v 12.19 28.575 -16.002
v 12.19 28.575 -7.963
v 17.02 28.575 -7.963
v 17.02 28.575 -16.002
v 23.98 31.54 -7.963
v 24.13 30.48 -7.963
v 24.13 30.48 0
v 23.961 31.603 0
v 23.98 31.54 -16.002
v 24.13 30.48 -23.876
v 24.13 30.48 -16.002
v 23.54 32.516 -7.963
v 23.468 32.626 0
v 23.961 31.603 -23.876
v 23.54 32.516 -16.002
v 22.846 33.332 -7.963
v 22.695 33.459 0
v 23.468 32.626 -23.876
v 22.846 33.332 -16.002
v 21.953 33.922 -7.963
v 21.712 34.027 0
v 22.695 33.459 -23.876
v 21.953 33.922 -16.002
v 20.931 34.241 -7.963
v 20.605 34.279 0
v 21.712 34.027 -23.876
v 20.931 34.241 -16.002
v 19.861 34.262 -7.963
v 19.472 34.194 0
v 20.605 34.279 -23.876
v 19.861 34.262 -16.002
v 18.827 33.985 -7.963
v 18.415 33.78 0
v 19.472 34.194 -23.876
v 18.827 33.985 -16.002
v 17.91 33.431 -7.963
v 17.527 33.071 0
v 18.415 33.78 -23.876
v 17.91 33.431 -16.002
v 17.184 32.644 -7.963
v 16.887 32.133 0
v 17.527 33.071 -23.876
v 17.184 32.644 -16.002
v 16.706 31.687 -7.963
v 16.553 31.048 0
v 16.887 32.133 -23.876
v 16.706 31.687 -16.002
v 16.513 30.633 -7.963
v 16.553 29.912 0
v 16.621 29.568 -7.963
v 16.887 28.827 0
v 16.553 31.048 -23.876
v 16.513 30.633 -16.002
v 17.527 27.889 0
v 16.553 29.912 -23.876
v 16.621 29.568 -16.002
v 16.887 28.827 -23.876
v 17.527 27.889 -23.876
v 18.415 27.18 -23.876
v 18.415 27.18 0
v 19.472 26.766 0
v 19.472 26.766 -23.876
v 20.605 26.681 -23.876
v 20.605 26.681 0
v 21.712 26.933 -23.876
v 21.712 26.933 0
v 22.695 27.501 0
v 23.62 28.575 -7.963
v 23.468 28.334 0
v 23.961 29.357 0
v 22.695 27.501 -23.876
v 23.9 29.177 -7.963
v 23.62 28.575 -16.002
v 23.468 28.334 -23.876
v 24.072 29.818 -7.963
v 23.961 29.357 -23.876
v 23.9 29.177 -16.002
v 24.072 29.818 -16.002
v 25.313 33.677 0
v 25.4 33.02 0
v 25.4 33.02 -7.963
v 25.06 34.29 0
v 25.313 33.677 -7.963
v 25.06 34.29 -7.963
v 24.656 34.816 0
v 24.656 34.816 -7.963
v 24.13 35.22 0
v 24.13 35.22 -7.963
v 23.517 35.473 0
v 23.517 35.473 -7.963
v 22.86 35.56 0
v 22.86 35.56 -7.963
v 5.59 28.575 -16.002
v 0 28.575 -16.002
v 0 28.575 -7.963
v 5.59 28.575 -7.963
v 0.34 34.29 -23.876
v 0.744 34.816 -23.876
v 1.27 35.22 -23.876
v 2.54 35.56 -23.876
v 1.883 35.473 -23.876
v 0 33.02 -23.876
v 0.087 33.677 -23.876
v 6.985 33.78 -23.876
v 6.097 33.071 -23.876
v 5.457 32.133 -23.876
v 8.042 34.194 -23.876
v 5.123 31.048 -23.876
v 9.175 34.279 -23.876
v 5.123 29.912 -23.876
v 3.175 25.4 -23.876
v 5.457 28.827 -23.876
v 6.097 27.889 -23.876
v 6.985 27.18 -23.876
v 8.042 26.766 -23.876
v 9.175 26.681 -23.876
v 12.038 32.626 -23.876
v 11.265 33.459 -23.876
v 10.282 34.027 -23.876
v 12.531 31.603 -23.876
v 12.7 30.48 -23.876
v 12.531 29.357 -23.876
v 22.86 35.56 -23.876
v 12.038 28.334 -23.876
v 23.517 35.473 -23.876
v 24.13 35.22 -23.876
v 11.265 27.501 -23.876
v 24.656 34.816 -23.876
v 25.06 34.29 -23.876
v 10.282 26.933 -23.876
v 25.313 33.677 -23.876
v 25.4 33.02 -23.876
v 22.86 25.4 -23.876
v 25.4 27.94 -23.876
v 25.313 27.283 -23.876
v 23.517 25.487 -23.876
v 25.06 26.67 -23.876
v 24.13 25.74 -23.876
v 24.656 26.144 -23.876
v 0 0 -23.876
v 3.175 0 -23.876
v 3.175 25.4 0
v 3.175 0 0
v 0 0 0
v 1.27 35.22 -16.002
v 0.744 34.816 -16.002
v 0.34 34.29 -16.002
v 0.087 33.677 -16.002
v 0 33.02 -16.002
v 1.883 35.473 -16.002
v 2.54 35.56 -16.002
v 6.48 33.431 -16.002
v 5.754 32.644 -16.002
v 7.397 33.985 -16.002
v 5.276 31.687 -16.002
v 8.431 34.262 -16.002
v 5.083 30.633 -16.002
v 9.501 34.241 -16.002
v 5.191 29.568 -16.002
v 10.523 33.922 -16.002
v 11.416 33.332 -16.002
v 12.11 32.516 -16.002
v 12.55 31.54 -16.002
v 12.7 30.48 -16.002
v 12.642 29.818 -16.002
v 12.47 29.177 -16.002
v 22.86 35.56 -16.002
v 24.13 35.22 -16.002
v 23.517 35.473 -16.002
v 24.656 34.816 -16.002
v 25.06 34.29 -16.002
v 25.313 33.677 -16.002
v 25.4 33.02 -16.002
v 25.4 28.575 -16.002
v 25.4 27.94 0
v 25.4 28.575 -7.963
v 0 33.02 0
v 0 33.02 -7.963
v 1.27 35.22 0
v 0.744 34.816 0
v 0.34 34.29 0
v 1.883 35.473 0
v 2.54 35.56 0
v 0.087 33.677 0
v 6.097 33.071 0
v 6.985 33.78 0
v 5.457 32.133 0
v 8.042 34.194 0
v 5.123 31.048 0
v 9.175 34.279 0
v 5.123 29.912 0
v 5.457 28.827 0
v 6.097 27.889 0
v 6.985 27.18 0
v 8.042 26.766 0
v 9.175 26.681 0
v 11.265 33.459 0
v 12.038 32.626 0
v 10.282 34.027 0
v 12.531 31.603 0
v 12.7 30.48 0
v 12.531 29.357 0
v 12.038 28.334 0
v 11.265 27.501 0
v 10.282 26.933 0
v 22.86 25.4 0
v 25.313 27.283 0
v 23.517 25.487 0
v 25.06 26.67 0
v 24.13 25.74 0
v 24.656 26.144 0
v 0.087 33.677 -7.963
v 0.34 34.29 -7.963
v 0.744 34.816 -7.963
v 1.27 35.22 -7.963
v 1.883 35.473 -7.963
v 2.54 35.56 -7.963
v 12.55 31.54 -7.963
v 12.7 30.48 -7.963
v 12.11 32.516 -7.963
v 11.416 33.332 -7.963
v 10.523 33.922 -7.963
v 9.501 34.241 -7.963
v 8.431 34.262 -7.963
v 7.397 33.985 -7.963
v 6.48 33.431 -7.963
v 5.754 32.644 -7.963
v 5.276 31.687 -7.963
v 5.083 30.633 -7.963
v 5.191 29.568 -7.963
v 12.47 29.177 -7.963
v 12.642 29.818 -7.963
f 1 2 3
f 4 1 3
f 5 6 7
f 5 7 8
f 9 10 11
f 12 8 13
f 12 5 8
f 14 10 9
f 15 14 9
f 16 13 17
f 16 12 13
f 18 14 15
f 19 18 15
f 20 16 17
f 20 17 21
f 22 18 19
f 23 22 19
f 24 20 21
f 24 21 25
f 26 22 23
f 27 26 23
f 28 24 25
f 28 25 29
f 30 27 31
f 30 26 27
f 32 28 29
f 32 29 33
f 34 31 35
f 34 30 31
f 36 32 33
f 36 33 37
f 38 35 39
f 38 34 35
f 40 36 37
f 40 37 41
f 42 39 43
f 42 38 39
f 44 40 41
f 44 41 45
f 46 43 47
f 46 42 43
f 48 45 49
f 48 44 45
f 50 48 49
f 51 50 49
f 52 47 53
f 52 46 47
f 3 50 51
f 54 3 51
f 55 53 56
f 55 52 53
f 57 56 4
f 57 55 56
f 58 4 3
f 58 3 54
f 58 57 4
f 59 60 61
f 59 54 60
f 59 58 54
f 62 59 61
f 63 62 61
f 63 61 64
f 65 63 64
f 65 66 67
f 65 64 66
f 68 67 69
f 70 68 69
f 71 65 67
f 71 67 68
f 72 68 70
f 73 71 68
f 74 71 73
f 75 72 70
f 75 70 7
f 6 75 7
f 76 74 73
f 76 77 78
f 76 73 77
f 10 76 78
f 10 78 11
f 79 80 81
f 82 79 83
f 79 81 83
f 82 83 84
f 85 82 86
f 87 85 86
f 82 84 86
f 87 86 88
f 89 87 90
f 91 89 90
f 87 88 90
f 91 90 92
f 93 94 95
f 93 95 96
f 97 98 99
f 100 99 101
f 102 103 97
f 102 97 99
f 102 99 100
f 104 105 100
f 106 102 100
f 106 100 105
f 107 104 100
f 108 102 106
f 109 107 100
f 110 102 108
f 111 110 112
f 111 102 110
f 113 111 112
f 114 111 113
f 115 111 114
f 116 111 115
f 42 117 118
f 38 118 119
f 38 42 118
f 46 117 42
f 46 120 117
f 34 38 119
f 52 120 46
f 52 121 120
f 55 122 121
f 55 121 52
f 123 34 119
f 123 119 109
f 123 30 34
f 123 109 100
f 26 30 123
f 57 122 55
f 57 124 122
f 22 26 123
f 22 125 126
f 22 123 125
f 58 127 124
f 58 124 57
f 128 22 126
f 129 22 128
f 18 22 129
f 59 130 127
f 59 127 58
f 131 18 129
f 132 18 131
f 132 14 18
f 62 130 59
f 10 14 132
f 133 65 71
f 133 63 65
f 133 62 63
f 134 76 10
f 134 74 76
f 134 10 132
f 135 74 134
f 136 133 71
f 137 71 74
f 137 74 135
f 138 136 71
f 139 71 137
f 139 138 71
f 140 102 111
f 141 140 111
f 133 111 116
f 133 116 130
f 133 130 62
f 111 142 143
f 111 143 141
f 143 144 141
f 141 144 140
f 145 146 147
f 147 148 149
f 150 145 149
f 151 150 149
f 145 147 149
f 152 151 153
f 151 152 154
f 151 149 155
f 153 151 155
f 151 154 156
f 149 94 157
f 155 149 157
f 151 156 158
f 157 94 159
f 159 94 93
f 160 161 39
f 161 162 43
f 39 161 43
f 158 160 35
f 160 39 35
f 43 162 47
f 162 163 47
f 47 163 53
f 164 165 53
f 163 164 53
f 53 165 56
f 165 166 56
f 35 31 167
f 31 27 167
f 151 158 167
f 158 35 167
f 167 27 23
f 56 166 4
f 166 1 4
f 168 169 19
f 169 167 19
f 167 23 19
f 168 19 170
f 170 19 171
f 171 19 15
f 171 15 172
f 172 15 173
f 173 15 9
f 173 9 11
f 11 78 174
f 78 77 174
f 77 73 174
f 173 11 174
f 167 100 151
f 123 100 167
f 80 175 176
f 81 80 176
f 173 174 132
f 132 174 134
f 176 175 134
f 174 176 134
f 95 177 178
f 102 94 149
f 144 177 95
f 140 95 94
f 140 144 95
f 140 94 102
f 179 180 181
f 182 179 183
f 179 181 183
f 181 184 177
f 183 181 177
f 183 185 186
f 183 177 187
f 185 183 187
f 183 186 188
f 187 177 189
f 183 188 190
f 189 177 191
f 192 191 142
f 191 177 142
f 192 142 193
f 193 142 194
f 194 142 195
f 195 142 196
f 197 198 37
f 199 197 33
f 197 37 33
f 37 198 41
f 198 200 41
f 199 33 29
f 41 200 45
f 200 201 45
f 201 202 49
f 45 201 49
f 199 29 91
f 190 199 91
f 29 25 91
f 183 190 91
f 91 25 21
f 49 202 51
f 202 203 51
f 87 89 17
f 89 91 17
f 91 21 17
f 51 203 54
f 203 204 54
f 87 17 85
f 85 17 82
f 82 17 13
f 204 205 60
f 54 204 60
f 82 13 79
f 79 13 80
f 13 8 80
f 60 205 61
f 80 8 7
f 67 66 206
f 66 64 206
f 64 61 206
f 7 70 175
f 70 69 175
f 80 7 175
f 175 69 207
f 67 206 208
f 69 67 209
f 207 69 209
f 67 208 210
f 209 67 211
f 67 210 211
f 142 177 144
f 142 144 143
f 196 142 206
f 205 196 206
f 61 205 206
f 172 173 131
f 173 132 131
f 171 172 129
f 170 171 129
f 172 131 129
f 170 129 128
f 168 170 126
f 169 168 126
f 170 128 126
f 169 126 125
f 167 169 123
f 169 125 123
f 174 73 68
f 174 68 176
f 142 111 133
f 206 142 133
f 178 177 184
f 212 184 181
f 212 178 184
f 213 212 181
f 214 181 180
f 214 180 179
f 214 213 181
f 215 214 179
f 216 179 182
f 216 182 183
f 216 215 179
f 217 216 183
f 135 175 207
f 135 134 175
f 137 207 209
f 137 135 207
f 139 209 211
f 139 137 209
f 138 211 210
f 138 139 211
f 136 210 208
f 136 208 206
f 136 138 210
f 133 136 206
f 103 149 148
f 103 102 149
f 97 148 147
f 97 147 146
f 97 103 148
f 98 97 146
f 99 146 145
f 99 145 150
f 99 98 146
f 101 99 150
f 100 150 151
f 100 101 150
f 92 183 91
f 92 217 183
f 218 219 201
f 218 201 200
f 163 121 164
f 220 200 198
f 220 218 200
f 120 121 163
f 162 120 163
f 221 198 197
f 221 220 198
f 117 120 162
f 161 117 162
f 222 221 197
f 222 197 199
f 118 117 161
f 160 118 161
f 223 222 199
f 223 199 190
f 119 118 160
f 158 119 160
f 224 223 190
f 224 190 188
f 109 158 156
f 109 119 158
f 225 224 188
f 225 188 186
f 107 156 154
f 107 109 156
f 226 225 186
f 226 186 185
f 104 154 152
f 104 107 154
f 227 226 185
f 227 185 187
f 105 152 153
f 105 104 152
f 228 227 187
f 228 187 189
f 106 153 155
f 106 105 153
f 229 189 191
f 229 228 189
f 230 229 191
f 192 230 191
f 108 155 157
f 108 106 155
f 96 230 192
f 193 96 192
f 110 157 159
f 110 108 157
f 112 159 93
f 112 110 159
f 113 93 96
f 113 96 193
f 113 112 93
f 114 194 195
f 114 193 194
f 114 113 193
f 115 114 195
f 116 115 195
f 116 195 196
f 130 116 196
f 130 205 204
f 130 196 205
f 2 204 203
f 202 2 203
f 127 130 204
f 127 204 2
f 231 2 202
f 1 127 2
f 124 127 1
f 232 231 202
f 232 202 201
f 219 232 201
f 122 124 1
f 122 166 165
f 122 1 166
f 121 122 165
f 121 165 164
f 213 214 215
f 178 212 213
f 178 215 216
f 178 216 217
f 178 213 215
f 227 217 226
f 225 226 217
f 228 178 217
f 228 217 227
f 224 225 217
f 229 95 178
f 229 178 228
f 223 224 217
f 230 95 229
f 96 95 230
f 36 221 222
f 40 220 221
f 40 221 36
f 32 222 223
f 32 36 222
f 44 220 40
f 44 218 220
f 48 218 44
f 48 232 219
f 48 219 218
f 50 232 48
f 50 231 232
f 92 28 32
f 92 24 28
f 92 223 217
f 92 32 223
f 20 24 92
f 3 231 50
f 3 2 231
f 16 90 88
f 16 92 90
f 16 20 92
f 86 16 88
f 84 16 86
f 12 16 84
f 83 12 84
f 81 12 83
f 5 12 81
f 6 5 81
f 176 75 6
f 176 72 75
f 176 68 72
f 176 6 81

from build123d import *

# Parameters (mm, degrees)
SKETCH1_W               = 23.876
SKETCH1_H               = 25.4
BOSS_EXTRUDE1_DEPTH     = 3.175
SKETCH2_W               = 25.4
SKETCH2_H               = 23.876
BOSS_EXTRUDE2_DEPTH     = 3.175
SKETCH3_W               = 25.4
SKETCH3_H               = 7.9629
SKETCH3_H_2             = 7.874
BOSS_EXTRUDE3_DEPTH     = 6.985
CUT_EXTRUDE1_DEPTH      = 50.796957497
CUT_EXTRUDE1_DEPTH_BACK = 50.796957497
SKETCH4_R               = 3.81
FILLET1_R               = 2.54
FILLET2_R               = 2.54
FILLET3_R               = 2.54


with BuildPart() as part:
    # Sketch1 → Boss-Extrude1 (new body)
    with BuildSketch(Plane(origin=(0, 0, 0), x_dir=(0, 0, -1), z_dir=(1, 0, 0))):
        with Locations((11.938, 12.7)):
            Rectangle(SKETCH1_W, SKETCH1_H)
    extrude(amount=BOSS_EXTRUDE1_DEPTH)

    # Sketch2 → Boss-Extrude2 (add)
    with BuildSketch(Plane(origin=(0, 25.4, 0), x_dir=(1, 0, 0), z_dir=(0, 1, 0))):
        with Locations((12.7, 11.938)):
            Rectangle(SKETCH2_W, SKETCH2_H)
    extrude(amount=BOSS_EXTRUDE2_DEPTH)

    # Sketch3 → Boss-Extrude3 (add)
    with BuildSketch(Plane(origin=(0, 28.575, 0), x_dir=(1, 0, 0), z_dir=(0, 1, 0))):
        with Locations((12.7, 3.98145)):
            Rectangle(SKETCH3_W, SKETCH3_H)
        with Locations((12.7, 19.939)):
            Rectangle(SKETCH3_W, SKETCH3_H_2)
    extrude(amount=BOSS_EXTRUDE3_DEPTH)

    # Sketch4 → Cut-Extrude1 (cut, two sides: drawn at the far end of the back side and taken through both)
    with BuildSketch(Plane.XY.offset(-CUT_EXTRUDE1_DEPTH_BACK)):
        with Locations((8.89, 30.48)):
            Circle(SKETCH4_R)
        with Locations((20.32, 30.48)):
            Circle(SKETCH4_R)
    extrude(amount=CUT_EXTRUDE1_DEPTH + CUT_EXTRUDE1_DEPTH_BACK, mode=Mode.SUBTRACT)

    # Fillet1
    fillet1_edges = [part.edges().sort_by_distance(p)[0] for p in [
        (0, 35.56, -3.98145),
        (0, 35.56, -19.939),
    ]]
    fillet(fillet1_edges, radius=FILLET1_R)

    # Fillet2
    fillet2_edges = [part.edges().sort_by_distance(p)[0] for p in [
        (25.4, 25.4, -11.938),
    ]]
    fillet(fillet2_edges, radius=FILLET2_R)

    # Fillet3
    fillet3_edges = [part.edges().sort_by_distance(p)[0] for p in [
        (25.4, 35.56, -3.98145),
        (25.4, 35.56, -19.939),
    ]]
    fillet(fillet3_edges, radius=FILLET3_R)


solid = part.part
